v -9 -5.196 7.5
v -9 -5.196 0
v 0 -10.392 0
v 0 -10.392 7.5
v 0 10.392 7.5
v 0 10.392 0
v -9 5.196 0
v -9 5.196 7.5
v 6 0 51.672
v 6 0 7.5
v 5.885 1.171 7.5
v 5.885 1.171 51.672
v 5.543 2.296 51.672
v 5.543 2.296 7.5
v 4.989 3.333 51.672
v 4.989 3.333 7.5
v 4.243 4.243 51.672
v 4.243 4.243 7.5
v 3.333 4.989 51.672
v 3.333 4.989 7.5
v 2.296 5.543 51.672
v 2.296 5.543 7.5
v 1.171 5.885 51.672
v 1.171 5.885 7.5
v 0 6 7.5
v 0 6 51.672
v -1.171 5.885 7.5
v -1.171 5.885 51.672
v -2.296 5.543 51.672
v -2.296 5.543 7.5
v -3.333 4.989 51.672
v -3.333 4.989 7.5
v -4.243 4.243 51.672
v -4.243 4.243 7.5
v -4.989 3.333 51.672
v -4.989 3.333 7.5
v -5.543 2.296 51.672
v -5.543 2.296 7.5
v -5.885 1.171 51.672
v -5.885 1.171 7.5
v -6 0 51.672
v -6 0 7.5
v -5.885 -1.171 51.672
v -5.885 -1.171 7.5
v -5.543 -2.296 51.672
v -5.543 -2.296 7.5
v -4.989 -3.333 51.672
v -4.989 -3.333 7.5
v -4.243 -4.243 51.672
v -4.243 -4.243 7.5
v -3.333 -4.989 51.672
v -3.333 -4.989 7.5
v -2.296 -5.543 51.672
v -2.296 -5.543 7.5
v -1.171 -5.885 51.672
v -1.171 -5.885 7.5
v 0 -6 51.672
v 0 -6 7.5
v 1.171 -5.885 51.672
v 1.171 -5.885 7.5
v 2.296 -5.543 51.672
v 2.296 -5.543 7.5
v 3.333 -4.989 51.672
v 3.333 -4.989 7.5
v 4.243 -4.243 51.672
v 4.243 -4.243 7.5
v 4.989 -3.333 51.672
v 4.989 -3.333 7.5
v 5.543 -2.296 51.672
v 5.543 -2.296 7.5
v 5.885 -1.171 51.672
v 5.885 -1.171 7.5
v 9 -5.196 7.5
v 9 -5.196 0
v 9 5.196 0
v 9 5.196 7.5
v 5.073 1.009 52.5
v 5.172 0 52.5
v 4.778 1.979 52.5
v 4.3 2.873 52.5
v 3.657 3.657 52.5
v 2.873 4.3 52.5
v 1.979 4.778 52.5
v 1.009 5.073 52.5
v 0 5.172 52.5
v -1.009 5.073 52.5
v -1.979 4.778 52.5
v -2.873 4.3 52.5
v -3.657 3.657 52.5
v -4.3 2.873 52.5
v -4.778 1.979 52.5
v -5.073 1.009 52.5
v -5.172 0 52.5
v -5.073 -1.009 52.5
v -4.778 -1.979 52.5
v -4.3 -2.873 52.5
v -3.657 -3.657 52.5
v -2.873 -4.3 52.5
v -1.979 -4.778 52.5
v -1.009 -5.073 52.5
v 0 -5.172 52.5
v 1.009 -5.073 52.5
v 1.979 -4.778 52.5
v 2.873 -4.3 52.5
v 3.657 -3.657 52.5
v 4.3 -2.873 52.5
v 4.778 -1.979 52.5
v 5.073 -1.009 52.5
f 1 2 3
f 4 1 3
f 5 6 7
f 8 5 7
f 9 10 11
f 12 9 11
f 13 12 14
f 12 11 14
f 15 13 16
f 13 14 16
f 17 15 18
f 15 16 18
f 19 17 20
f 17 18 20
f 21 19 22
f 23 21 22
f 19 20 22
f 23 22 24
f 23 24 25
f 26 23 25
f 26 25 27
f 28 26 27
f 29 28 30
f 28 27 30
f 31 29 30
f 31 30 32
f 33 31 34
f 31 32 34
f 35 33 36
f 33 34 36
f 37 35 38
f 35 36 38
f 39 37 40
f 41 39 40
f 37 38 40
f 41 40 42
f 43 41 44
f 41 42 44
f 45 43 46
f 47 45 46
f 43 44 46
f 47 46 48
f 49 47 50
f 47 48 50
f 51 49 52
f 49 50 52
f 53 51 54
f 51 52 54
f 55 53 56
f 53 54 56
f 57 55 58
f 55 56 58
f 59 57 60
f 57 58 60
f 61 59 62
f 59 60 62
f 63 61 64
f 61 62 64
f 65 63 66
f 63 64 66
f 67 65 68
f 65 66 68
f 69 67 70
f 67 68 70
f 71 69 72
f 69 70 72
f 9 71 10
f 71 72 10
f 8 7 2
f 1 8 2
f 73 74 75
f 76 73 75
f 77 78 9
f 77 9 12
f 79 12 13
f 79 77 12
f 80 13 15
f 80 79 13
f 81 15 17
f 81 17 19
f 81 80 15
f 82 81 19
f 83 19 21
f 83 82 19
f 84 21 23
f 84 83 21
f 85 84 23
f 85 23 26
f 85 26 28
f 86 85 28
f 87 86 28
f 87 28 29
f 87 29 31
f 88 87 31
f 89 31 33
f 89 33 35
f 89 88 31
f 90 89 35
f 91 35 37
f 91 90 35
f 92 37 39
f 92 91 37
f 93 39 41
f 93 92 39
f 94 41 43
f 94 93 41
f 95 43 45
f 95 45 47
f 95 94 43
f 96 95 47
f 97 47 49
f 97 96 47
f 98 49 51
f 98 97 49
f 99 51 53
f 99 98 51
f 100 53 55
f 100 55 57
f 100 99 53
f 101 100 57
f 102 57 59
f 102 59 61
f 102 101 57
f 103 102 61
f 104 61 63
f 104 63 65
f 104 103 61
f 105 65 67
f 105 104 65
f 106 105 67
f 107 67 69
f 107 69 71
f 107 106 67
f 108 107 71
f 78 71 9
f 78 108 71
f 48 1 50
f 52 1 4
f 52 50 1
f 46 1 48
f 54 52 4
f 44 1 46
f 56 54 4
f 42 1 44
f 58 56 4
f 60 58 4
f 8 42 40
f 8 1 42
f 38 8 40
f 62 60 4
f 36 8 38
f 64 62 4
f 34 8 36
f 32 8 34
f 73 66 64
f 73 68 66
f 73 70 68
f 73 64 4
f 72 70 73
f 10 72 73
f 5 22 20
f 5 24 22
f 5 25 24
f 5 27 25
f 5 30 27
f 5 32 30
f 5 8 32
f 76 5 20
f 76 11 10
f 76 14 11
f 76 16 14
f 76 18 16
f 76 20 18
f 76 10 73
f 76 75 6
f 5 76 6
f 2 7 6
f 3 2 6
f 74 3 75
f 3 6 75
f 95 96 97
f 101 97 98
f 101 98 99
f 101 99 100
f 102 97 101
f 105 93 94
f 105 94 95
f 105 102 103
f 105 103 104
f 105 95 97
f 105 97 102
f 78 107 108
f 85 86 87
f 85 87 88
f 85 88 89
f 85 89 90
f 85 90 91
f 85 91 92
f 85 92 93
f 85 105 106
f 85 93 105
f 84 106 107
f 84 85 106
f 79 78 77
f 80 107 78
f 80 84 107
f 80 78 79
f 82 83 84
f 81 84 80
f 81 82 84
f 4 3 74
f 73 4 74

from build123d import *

# Parameters (mm, degrees)
EXTRUDE_1_DEPTH = 7.5
SKETCH_2_R      = 6
EXTRUDE_2_DEPTH = 45
CHAMFER_1_SIZE  = 0.828


with BuildPart() as part:
    # Эскиз1 → Бобышка-Вытянуть1 (new body)
    with BuildSketch(Plane.XY):
        Polygon((0, 10.392304845), (-9, 5.196152423), (-9, -5.196152423), (0, -10.392304845), (9, -5.196152423), (9, 5.196152423), align=None)
    extrude(amount=EXTRUDE_1_DEPTH)

    # Эскиз2 → Бобышка-Вытянуть2 (add)
    with BuildSketch(Plane.XY.offset(7.5)):
        Circle(SKETCH_2_R)
    extrude(amount=EXTRUDE_2_DEPTH)

    # Фаска1
    chamfer_1_edges = [part.edges().sort_by_distance(p)[0] for p in [
        (-6, 0, 52.5),
    ]]
    chamfer(chamfer_1_edges, length=CHAMFER_1_SIZE)


solid = part.part
